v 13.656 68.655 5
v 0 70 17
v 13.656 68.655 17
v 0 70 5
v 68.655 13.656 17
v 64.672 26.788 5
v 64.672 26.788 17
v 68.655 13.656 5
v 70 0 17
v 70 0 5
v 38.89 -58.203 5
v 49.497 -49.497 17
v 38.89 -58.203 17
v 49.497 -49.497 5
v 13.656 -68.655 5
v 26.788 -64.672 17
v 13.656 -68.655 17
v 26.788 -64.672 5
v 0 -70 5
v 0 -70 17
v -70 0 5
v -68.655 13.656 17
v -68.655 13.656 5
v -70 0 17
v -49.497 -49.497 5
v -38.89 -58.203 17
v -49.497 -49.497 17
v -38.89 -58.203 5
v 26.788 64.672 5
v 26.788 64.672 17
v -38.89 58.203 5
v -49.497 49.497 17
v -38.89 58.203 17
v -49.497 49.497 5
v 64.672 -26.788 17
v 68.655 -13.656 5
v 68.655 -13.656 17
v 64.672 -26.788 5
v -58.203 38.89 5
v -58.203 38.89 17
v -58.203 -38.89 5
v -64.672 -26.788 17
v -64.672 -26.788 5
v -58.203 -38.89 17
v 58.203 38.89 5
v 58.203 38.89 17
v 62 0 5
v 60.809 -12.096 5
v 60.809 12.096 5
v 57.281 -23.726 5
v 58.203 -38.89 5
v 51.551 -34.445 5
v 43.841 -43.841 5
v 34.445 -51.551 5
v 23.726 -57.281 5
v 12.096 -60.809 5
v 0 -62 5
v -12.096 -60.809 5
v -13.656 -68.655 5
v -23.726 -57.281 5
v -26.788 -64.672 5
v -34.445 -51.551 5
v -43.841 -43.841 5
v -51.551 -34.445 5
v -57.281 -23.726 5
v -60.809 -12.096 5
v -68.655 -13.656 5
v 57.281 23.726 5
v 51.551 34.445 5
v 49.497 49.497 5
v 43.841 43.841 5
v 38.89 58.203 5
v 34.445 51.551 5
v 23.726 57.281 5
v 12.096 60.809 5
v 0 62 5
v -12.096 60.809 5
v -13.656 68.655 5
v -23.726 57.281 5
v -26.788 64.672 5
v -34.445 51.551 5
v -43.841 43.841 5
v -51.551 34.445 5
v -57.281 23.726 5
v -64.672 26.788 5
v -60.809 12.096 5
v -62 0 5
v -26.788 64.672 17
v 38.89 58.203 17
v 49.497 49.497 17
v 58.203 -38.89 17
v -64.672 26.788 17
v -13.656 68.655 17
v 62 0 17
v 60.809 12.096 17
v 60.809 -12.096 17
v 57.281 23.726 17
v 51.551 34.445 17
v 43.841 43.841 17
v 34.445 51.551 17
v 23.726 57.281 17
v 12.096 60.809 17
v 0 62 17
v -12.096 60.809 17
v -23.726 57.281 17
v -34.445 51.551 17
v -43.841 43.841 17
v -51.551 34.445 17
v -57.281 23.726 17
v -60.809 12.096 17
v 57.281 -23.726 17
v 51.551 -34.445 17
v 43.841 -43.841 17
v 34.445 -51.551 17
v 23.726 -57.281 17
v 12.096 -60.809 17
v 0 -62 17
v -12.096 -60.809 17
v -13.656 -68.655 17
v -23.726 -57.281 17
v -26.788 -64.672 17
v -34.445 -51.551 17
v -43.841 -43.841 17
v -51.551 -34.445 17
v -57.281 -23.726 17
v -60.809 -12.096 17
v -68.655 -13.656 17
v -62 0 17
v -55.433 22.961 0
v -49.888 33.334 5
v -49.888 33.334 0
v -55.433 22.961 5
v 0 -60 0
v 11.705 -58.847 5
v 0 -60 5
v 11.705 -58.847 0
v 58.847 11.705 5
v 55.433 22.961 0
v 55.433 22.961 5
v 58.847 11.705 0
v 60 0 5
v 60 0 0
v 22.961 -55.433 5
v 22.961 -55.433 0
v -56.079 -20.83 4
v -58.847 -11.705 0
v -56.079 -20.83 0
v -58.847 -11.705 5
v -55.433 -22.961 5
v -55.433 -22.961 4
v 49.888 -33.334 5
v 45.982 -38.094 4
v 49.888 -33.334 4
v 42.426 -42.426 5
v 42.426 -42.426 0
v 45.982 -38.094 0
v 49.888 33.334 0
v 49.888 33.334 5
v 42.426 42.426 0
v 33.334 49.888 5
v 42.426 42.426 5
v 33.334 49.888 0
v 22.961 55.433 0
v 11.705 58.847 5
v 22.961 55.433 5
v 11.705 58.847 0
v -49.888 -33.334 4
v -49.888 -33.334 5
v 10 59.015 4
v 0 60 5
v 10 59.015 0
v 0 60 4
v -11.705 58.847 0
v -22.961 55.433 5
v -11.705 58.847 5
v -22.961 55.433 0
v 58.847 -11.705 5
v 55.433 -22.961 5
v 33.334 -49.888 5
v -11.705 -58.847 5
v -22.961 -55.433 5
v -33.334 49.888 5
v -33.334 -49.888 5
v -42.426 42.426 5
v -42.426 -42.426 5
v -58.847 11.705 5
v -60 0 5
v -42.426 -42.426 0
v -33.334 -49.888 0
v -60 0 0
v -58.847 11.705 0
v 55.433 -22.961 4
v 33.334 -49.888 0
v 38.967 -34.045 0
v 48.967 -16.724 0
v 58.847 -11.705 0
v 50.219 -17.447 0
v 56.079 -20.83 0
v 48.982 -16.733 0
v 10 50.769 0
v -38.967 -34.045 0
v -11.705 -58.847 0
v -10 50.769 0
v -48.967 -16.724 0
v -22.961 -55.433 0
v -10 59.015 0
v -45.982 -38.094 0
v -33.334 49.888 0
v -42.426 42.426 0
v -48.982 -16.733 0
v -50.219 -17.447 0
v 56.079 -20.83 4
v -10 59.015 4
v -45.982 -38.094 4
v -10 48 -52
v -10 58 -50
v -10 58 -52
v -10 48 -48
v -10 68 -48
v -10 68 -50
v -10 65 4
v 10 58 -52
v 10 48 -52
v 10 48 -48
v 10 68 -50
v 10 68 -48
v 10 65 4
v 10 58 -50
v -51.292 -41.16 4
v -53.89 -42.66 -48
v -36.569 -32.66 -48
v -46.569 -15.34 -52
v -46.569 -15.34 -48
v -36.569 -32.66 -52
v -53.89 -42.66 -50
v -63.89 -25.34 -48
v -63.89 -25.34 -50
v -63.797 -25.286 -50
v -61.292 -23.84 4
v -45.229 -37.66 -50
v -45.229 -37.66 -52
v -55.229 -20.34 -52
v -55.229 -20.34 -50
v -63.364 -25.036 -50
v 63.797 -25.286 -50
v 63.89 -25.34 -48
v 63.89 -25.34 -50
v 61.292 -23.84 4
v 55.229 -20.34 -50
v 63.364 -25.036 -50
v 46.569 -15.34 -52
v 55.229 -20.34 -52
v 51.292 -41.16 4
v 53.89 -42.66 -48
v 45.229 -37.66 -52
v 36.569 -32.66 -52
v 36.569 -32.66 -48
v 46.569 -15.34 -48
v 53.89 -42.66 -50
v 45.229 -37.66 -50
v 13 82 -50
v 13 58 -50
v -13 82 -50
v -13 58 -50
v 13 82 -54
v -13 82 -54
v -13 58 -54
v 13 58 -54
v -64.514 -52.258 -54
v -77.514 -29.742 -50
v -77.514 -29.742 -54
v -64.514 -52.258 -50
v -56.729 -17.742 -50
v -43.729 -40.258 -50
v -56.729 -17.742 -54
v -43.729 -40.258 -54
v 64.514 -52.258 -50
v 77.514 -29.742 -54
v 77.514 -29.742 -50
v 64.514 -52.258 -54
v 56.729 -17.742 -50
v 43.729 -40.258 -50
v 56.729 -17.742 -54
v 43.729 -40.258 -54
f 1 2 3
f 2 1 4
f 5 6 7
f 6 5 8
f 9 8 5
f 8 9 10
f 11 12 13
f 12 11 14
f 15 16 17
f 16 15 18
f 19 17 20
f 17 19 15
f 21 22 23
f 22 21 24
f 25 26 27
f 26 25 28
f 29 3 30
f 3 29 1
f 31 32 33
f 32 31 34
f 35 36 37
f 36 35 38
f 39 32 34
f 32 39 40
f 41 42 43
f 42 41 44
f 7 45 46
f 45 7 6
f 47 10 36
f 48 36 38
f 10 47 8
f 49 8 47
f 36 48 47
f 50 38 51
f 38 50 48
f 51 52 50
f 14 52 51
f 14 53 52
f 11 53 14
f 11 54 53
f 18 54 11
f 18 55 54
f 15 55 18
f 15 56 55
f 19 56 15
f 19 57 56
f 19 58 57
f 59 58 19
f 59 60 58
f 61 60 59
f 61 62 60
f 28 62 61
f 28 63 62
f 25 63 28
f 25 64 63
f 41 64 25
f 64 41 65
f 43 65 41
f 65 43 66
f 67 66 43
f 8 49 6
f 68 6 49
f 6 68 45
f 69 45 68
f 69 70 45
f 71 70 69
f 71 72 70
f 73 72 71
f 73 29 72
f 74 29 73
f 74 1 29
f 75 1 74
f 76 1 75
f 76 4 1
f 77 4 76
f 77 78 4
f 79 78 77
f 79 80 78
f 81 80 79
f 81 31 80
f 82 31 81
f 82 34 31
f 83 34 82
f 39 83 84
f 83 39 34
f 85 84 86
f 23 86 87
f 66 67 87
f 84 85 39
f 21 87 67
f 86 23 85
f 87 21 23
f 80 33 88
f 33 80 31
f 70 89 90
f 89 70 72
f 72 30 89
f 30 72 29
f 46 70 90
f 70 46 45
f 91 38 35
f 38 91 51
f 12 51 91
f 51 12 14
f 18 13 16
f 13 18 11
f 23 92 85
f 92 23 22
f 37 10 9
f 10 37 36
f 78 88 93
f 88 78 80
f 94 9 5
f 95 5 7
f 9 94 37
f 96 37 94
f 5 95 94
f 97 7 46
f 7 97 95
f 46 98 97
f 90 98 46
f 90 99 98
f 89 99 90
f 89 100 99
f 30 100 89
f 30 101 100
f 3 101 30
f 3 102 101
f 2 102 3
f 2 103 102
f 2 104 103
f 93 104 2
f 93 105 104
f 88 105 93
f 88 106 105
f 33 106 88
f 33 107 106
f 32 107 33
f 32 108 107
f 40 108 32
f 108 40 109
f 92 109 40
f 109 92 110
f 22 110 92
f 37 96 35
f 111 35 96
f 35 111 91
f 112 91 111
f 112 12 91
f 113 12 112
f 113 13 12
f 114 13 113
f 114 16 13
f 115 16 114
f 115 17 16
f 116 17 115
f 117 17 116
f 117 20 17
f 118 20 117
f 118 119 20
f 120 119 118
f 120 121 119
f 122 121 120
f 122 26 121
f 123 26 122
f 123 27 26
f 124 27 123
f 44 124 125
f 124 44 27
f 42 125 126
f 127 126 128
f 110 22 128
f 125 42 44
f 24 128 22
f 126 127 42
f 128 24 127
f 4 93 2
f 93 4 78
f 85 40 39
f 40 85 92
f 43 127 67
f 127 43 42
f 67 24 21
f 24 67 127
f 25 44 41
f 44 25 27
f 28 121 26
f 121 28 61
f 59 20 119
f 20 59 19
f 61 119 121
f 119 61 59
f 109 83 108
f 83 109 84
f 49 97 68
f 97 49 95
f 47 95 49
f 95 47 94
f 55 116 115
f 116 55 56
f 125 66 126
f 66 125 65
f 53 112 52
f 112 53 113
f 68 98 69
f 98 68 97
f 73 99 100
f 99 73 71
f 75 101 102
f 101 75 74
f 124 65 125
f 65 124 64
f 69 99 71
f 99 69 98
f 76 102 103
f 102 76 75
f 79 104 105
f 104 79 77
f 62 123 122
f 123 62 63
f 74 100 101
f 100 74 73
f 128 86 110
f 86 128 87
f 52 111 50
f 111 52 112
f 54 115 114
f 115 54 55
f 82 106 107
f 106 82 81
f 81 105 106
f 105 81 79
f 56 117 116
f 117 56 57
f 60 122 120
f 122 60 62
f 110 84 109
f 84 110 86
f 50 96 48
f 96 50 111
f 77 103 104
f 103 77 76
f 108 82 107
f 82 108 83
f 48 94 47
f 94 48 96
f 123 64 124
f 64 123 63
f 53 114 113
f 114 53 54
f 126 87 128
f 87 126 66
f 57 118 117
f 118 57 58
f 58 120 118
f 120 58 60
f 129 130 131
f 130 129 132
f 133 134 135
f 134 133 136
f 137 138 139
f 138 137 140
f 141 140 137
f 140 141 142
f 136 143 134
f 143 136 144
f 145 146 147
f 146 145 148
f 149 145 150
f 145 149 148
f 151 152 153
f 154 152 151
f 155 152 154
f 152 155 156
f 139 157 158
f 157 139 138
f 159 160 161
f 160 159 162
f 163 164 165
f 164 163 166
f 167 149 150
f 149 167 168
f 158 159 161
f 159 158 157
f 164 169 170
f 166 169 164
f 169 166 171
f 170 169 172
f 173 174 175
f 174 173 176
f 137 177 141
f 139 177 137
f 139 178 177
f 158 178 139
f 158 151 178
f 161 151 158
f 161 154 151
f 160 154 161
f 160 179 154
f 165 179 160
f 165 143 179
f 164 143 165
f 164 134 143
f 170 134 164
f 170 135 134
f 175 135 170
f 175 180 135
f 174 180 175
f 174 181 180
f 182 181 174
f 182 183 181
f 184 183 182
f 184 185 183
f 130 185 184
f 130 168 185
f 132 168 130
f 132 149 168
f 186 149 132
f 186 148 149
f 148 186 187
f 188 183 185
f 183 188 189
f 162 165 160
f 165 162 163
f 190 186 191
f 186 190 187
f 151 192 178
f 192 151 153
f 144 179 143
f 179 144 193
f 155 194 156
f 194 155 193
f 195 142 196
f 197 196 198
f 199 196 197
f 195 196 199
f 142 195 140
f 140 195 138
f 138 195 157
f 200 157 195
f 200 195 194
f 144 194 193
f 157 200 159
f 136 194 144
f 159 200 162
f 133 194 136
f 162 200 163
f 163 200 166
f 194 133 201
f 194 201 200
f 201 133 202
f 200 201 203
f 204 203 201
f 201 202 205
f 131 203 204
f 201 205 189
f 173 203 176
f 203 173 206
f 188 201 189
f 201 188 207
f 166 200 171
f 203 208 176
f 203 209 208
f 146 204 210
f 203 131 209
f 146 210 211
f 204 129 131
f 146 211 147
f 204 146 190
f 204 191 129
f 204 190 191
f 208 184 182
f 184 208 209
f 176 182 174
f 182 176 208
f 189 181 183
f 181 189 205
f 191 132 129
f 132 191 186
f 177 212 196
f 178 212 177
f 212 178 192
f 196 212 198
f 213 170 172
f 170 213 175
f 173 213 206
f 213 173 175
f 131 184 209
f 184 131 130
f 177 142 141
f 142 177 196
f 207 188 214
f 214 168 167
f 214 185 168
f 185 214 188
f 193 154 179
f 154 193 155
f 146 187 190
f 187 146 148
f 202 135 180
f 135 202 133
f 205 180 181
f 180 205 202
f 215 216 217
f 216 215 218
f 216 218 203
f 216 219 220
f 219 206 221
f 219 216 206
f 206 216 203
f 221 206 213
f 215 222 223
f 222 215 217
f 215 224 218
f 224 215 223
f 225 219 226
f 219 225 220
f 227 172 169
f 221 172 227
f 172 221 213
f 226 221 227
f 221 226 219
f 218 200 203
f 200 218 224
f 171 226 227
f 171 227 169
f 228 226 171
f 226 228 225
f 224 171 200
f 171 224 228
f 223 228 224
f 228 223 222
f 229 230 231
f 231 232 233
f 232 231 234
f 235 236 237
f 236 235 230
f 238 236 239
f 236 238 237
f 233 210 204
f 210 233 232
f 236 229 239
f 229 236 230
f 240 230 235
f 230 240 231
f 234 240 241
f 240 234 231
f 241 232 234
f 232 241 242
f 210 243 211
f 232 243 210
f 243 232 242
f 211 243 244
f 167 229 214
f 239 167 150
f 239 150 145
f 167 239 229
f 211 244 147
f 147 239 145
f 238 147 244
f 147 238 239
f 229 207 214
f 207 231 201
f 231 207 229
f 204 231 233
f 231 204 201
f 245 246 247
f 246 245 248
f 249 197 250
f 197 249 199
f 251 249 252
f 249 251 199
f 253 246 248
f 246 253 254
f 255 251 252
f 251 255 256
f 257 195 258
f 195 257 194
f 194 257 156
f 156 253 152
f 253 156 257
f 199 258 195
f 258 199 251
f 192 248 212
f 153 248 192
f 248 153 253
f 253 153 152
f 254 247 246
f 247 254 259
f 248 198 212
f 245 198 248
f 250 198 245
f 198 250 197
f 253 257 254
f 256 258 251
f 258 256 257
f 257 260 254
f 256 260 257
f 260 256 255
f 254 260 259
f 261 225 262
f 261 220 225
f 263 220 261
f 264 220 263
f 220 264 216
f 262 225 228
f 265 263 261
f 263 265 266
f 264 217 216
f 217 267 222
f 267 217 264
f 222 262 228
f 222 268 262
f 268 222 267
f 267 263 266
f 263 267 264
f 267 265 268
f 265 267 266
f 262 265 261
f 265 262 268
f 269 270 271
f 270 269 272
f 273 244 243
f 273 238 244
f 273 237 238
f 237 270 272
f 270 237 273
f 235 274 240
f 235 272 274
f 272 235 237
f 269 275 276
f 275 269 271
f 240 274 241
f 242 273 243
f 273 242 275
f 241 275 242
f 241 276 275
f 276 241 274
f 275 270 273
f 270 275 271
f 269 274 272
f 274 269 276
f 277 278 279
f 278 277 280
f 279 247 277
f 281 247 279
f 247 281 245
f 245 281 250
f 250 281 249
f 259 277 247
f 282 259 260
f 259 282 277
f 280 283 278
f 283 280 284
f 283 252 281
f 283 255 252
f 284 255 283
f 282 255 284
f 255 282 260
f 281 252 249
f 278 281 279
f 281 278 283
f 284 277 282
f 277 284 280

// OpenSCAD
// Simple Pot Stand CAD Source
// Student style simple model
// Units: mm

$fn = 32;

// Main sizes
base_radius = 60;
base_height = 5;

rim_outer = 70;
rim_inner = 62;
rim_height = 12;

leg_height = 52;
leg_top_width = 14;
leg_bottom_width = 20;
leg_depth = 20;

foot_width = 24;
foot_depth = 26;
foot_height = 4;

// Main round base
cylinder(
    r = base_radius,
    h = base_height
);

// Raised circular rim
translate([0,0,base_height])
difference() {
    cylinder(r = rim_outer, h = rim_height);
    cylinder(r = rim_inner, h = rim_height);
}

// One simple leg
module leg(angle) {

    rotate([0,0,angle])
    translate([48,-leg_depth/2,-leg_height])
    hull() {

        // lower part
        cube([
            leg_bottom_width,
            leg_depth,
            4
        ]);

        // upper part
        translate([
            (leg_bottom_width-leg_top_width)/2,
            0,
            leg_height
        ])
        cube([
            leg_top_width,
            leg_depth,
            4
        ]);
    }
}

// Three legs
leg(90);
leg(210);
leg(330);

// Small feet
module foot(angle) {

    rotate([0,0,angle])
    translate([58,-foot_depth/2,-leg_height-foot_height+2])
    cube([
        foot_width,
        foot_depth,
        foot_height
    ]);
}

foot(90);
foot(210);
foot(330);

// End of simple pot stand
